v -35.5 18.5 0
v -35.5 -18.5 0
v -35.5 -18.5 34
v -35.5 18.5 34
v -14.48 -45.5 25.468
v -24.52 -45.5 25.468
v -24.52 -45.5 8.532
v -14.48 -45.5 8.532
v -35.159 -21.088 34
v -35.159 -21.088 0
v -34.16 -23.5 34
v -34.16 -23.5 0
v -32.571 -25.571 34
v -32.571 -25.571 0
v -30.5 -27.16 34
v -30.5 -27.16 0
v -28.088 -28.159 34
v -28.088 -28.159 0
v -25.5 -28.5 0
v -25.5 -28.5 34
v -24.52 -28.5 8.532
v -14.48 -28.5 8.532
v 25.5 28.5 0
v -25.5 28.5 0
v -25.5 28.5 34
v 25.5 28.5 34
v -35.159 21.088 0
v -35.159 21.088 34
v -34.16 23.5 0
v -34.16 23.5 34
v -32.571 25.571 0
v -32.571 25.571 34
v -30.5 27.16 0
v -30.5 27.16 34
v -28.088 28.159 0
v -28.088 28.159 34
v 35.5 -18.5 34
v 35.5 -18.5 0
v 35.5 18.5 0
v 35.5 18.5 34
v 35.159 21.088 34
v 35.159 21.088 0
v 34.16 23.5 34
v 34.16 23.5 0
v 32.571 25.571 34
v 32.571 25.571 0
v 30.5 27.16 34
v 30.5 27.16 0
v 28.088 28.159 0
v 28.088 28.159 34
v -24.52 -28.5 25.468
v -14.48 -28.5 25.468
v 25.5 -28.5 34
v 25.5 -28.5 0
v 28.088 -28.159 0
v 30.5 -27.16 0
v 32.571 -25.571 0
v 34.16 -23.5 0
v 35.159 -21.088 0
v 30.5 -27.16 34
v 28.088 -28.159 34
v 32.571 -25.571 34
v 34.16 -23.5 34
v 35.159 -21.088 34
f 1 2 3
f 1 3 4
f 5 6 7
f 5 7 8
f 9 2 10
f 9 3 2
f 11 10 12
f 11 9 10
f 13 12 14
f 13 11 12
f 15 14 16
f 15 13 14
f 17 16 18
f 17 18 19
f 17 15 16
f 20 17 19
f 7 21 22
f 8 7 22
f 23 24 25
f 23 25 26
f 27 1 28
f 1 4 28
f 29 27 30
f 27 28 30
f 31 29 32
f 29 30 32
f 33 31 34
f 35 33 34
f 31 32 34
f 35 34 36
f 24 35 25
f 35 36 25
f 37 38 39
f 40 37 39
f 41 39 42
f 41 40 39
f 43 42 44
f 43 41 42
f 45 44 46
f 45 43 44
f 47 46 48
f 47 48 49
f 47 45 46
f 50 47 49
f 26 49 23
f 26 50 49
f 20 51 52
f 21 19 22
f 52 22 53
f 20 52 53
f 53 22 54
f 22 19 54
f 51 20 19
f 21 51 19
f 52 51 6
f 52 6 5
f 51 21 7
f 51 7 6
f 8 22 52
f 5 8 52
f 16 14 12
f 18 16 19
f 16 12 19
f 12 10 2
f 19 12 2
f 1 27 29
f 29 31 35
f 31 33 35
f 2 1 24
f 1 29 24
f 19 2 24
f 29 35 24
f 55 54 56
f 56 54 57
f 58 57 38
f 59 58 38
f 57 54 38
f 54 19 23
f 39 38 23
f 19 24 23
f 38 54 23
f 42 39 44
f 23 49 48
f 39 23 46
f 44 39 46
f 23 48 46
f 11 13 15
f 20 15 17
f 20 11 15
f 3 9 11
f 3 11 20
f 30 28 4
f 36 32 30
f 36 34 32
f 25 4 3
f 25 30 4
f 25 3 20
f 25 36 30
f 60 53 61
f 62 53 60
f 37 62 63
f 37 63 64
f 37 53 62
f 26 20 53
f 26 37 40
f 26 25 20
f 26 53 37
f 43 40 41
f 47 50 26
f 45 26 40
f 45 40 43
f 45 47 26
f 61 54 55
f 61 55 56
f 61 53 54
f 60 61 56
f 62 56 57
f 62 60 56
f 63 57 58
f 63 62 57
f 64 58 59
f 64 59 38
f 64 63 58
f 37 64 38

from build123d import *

# Parameters (mm, degrees)
F0_W     = 71
F0_H     = 57
F1_DEPTH = 34
F2_R     = 10
F3_W     = 10.040418
F3_H     = 16.936636
F4_DEPTH = 17


with BuildPart() as f1:
    # F0 (on Top) → F1 (new body)
    with BuildSketch(Plane.XY):
        Rectangle(F0_W, F0_H)
    extrude(amount=F1_DEPTH)

    # F2
    f2_edges = [f1.edges().sort_by_distance(p)[0] for p in [
        (-35.5, 28.5, 17),
        (35.5, 28.5, 17),
        (-35.5, -28.5, 17),
        (35.5, -28.5, 17),
    ]]
    fillet(f2_edges, radius=F2_R)

    # F3 (on face) → F4 (join)
    with BuildSketch(Plane.XZ.offset(28.5)):
        with Locations((-19.5, 17)):
            Rectangle(F3_W, F3_H)
    extrude(amount=F4_DEPTH)


solid = f1.part
